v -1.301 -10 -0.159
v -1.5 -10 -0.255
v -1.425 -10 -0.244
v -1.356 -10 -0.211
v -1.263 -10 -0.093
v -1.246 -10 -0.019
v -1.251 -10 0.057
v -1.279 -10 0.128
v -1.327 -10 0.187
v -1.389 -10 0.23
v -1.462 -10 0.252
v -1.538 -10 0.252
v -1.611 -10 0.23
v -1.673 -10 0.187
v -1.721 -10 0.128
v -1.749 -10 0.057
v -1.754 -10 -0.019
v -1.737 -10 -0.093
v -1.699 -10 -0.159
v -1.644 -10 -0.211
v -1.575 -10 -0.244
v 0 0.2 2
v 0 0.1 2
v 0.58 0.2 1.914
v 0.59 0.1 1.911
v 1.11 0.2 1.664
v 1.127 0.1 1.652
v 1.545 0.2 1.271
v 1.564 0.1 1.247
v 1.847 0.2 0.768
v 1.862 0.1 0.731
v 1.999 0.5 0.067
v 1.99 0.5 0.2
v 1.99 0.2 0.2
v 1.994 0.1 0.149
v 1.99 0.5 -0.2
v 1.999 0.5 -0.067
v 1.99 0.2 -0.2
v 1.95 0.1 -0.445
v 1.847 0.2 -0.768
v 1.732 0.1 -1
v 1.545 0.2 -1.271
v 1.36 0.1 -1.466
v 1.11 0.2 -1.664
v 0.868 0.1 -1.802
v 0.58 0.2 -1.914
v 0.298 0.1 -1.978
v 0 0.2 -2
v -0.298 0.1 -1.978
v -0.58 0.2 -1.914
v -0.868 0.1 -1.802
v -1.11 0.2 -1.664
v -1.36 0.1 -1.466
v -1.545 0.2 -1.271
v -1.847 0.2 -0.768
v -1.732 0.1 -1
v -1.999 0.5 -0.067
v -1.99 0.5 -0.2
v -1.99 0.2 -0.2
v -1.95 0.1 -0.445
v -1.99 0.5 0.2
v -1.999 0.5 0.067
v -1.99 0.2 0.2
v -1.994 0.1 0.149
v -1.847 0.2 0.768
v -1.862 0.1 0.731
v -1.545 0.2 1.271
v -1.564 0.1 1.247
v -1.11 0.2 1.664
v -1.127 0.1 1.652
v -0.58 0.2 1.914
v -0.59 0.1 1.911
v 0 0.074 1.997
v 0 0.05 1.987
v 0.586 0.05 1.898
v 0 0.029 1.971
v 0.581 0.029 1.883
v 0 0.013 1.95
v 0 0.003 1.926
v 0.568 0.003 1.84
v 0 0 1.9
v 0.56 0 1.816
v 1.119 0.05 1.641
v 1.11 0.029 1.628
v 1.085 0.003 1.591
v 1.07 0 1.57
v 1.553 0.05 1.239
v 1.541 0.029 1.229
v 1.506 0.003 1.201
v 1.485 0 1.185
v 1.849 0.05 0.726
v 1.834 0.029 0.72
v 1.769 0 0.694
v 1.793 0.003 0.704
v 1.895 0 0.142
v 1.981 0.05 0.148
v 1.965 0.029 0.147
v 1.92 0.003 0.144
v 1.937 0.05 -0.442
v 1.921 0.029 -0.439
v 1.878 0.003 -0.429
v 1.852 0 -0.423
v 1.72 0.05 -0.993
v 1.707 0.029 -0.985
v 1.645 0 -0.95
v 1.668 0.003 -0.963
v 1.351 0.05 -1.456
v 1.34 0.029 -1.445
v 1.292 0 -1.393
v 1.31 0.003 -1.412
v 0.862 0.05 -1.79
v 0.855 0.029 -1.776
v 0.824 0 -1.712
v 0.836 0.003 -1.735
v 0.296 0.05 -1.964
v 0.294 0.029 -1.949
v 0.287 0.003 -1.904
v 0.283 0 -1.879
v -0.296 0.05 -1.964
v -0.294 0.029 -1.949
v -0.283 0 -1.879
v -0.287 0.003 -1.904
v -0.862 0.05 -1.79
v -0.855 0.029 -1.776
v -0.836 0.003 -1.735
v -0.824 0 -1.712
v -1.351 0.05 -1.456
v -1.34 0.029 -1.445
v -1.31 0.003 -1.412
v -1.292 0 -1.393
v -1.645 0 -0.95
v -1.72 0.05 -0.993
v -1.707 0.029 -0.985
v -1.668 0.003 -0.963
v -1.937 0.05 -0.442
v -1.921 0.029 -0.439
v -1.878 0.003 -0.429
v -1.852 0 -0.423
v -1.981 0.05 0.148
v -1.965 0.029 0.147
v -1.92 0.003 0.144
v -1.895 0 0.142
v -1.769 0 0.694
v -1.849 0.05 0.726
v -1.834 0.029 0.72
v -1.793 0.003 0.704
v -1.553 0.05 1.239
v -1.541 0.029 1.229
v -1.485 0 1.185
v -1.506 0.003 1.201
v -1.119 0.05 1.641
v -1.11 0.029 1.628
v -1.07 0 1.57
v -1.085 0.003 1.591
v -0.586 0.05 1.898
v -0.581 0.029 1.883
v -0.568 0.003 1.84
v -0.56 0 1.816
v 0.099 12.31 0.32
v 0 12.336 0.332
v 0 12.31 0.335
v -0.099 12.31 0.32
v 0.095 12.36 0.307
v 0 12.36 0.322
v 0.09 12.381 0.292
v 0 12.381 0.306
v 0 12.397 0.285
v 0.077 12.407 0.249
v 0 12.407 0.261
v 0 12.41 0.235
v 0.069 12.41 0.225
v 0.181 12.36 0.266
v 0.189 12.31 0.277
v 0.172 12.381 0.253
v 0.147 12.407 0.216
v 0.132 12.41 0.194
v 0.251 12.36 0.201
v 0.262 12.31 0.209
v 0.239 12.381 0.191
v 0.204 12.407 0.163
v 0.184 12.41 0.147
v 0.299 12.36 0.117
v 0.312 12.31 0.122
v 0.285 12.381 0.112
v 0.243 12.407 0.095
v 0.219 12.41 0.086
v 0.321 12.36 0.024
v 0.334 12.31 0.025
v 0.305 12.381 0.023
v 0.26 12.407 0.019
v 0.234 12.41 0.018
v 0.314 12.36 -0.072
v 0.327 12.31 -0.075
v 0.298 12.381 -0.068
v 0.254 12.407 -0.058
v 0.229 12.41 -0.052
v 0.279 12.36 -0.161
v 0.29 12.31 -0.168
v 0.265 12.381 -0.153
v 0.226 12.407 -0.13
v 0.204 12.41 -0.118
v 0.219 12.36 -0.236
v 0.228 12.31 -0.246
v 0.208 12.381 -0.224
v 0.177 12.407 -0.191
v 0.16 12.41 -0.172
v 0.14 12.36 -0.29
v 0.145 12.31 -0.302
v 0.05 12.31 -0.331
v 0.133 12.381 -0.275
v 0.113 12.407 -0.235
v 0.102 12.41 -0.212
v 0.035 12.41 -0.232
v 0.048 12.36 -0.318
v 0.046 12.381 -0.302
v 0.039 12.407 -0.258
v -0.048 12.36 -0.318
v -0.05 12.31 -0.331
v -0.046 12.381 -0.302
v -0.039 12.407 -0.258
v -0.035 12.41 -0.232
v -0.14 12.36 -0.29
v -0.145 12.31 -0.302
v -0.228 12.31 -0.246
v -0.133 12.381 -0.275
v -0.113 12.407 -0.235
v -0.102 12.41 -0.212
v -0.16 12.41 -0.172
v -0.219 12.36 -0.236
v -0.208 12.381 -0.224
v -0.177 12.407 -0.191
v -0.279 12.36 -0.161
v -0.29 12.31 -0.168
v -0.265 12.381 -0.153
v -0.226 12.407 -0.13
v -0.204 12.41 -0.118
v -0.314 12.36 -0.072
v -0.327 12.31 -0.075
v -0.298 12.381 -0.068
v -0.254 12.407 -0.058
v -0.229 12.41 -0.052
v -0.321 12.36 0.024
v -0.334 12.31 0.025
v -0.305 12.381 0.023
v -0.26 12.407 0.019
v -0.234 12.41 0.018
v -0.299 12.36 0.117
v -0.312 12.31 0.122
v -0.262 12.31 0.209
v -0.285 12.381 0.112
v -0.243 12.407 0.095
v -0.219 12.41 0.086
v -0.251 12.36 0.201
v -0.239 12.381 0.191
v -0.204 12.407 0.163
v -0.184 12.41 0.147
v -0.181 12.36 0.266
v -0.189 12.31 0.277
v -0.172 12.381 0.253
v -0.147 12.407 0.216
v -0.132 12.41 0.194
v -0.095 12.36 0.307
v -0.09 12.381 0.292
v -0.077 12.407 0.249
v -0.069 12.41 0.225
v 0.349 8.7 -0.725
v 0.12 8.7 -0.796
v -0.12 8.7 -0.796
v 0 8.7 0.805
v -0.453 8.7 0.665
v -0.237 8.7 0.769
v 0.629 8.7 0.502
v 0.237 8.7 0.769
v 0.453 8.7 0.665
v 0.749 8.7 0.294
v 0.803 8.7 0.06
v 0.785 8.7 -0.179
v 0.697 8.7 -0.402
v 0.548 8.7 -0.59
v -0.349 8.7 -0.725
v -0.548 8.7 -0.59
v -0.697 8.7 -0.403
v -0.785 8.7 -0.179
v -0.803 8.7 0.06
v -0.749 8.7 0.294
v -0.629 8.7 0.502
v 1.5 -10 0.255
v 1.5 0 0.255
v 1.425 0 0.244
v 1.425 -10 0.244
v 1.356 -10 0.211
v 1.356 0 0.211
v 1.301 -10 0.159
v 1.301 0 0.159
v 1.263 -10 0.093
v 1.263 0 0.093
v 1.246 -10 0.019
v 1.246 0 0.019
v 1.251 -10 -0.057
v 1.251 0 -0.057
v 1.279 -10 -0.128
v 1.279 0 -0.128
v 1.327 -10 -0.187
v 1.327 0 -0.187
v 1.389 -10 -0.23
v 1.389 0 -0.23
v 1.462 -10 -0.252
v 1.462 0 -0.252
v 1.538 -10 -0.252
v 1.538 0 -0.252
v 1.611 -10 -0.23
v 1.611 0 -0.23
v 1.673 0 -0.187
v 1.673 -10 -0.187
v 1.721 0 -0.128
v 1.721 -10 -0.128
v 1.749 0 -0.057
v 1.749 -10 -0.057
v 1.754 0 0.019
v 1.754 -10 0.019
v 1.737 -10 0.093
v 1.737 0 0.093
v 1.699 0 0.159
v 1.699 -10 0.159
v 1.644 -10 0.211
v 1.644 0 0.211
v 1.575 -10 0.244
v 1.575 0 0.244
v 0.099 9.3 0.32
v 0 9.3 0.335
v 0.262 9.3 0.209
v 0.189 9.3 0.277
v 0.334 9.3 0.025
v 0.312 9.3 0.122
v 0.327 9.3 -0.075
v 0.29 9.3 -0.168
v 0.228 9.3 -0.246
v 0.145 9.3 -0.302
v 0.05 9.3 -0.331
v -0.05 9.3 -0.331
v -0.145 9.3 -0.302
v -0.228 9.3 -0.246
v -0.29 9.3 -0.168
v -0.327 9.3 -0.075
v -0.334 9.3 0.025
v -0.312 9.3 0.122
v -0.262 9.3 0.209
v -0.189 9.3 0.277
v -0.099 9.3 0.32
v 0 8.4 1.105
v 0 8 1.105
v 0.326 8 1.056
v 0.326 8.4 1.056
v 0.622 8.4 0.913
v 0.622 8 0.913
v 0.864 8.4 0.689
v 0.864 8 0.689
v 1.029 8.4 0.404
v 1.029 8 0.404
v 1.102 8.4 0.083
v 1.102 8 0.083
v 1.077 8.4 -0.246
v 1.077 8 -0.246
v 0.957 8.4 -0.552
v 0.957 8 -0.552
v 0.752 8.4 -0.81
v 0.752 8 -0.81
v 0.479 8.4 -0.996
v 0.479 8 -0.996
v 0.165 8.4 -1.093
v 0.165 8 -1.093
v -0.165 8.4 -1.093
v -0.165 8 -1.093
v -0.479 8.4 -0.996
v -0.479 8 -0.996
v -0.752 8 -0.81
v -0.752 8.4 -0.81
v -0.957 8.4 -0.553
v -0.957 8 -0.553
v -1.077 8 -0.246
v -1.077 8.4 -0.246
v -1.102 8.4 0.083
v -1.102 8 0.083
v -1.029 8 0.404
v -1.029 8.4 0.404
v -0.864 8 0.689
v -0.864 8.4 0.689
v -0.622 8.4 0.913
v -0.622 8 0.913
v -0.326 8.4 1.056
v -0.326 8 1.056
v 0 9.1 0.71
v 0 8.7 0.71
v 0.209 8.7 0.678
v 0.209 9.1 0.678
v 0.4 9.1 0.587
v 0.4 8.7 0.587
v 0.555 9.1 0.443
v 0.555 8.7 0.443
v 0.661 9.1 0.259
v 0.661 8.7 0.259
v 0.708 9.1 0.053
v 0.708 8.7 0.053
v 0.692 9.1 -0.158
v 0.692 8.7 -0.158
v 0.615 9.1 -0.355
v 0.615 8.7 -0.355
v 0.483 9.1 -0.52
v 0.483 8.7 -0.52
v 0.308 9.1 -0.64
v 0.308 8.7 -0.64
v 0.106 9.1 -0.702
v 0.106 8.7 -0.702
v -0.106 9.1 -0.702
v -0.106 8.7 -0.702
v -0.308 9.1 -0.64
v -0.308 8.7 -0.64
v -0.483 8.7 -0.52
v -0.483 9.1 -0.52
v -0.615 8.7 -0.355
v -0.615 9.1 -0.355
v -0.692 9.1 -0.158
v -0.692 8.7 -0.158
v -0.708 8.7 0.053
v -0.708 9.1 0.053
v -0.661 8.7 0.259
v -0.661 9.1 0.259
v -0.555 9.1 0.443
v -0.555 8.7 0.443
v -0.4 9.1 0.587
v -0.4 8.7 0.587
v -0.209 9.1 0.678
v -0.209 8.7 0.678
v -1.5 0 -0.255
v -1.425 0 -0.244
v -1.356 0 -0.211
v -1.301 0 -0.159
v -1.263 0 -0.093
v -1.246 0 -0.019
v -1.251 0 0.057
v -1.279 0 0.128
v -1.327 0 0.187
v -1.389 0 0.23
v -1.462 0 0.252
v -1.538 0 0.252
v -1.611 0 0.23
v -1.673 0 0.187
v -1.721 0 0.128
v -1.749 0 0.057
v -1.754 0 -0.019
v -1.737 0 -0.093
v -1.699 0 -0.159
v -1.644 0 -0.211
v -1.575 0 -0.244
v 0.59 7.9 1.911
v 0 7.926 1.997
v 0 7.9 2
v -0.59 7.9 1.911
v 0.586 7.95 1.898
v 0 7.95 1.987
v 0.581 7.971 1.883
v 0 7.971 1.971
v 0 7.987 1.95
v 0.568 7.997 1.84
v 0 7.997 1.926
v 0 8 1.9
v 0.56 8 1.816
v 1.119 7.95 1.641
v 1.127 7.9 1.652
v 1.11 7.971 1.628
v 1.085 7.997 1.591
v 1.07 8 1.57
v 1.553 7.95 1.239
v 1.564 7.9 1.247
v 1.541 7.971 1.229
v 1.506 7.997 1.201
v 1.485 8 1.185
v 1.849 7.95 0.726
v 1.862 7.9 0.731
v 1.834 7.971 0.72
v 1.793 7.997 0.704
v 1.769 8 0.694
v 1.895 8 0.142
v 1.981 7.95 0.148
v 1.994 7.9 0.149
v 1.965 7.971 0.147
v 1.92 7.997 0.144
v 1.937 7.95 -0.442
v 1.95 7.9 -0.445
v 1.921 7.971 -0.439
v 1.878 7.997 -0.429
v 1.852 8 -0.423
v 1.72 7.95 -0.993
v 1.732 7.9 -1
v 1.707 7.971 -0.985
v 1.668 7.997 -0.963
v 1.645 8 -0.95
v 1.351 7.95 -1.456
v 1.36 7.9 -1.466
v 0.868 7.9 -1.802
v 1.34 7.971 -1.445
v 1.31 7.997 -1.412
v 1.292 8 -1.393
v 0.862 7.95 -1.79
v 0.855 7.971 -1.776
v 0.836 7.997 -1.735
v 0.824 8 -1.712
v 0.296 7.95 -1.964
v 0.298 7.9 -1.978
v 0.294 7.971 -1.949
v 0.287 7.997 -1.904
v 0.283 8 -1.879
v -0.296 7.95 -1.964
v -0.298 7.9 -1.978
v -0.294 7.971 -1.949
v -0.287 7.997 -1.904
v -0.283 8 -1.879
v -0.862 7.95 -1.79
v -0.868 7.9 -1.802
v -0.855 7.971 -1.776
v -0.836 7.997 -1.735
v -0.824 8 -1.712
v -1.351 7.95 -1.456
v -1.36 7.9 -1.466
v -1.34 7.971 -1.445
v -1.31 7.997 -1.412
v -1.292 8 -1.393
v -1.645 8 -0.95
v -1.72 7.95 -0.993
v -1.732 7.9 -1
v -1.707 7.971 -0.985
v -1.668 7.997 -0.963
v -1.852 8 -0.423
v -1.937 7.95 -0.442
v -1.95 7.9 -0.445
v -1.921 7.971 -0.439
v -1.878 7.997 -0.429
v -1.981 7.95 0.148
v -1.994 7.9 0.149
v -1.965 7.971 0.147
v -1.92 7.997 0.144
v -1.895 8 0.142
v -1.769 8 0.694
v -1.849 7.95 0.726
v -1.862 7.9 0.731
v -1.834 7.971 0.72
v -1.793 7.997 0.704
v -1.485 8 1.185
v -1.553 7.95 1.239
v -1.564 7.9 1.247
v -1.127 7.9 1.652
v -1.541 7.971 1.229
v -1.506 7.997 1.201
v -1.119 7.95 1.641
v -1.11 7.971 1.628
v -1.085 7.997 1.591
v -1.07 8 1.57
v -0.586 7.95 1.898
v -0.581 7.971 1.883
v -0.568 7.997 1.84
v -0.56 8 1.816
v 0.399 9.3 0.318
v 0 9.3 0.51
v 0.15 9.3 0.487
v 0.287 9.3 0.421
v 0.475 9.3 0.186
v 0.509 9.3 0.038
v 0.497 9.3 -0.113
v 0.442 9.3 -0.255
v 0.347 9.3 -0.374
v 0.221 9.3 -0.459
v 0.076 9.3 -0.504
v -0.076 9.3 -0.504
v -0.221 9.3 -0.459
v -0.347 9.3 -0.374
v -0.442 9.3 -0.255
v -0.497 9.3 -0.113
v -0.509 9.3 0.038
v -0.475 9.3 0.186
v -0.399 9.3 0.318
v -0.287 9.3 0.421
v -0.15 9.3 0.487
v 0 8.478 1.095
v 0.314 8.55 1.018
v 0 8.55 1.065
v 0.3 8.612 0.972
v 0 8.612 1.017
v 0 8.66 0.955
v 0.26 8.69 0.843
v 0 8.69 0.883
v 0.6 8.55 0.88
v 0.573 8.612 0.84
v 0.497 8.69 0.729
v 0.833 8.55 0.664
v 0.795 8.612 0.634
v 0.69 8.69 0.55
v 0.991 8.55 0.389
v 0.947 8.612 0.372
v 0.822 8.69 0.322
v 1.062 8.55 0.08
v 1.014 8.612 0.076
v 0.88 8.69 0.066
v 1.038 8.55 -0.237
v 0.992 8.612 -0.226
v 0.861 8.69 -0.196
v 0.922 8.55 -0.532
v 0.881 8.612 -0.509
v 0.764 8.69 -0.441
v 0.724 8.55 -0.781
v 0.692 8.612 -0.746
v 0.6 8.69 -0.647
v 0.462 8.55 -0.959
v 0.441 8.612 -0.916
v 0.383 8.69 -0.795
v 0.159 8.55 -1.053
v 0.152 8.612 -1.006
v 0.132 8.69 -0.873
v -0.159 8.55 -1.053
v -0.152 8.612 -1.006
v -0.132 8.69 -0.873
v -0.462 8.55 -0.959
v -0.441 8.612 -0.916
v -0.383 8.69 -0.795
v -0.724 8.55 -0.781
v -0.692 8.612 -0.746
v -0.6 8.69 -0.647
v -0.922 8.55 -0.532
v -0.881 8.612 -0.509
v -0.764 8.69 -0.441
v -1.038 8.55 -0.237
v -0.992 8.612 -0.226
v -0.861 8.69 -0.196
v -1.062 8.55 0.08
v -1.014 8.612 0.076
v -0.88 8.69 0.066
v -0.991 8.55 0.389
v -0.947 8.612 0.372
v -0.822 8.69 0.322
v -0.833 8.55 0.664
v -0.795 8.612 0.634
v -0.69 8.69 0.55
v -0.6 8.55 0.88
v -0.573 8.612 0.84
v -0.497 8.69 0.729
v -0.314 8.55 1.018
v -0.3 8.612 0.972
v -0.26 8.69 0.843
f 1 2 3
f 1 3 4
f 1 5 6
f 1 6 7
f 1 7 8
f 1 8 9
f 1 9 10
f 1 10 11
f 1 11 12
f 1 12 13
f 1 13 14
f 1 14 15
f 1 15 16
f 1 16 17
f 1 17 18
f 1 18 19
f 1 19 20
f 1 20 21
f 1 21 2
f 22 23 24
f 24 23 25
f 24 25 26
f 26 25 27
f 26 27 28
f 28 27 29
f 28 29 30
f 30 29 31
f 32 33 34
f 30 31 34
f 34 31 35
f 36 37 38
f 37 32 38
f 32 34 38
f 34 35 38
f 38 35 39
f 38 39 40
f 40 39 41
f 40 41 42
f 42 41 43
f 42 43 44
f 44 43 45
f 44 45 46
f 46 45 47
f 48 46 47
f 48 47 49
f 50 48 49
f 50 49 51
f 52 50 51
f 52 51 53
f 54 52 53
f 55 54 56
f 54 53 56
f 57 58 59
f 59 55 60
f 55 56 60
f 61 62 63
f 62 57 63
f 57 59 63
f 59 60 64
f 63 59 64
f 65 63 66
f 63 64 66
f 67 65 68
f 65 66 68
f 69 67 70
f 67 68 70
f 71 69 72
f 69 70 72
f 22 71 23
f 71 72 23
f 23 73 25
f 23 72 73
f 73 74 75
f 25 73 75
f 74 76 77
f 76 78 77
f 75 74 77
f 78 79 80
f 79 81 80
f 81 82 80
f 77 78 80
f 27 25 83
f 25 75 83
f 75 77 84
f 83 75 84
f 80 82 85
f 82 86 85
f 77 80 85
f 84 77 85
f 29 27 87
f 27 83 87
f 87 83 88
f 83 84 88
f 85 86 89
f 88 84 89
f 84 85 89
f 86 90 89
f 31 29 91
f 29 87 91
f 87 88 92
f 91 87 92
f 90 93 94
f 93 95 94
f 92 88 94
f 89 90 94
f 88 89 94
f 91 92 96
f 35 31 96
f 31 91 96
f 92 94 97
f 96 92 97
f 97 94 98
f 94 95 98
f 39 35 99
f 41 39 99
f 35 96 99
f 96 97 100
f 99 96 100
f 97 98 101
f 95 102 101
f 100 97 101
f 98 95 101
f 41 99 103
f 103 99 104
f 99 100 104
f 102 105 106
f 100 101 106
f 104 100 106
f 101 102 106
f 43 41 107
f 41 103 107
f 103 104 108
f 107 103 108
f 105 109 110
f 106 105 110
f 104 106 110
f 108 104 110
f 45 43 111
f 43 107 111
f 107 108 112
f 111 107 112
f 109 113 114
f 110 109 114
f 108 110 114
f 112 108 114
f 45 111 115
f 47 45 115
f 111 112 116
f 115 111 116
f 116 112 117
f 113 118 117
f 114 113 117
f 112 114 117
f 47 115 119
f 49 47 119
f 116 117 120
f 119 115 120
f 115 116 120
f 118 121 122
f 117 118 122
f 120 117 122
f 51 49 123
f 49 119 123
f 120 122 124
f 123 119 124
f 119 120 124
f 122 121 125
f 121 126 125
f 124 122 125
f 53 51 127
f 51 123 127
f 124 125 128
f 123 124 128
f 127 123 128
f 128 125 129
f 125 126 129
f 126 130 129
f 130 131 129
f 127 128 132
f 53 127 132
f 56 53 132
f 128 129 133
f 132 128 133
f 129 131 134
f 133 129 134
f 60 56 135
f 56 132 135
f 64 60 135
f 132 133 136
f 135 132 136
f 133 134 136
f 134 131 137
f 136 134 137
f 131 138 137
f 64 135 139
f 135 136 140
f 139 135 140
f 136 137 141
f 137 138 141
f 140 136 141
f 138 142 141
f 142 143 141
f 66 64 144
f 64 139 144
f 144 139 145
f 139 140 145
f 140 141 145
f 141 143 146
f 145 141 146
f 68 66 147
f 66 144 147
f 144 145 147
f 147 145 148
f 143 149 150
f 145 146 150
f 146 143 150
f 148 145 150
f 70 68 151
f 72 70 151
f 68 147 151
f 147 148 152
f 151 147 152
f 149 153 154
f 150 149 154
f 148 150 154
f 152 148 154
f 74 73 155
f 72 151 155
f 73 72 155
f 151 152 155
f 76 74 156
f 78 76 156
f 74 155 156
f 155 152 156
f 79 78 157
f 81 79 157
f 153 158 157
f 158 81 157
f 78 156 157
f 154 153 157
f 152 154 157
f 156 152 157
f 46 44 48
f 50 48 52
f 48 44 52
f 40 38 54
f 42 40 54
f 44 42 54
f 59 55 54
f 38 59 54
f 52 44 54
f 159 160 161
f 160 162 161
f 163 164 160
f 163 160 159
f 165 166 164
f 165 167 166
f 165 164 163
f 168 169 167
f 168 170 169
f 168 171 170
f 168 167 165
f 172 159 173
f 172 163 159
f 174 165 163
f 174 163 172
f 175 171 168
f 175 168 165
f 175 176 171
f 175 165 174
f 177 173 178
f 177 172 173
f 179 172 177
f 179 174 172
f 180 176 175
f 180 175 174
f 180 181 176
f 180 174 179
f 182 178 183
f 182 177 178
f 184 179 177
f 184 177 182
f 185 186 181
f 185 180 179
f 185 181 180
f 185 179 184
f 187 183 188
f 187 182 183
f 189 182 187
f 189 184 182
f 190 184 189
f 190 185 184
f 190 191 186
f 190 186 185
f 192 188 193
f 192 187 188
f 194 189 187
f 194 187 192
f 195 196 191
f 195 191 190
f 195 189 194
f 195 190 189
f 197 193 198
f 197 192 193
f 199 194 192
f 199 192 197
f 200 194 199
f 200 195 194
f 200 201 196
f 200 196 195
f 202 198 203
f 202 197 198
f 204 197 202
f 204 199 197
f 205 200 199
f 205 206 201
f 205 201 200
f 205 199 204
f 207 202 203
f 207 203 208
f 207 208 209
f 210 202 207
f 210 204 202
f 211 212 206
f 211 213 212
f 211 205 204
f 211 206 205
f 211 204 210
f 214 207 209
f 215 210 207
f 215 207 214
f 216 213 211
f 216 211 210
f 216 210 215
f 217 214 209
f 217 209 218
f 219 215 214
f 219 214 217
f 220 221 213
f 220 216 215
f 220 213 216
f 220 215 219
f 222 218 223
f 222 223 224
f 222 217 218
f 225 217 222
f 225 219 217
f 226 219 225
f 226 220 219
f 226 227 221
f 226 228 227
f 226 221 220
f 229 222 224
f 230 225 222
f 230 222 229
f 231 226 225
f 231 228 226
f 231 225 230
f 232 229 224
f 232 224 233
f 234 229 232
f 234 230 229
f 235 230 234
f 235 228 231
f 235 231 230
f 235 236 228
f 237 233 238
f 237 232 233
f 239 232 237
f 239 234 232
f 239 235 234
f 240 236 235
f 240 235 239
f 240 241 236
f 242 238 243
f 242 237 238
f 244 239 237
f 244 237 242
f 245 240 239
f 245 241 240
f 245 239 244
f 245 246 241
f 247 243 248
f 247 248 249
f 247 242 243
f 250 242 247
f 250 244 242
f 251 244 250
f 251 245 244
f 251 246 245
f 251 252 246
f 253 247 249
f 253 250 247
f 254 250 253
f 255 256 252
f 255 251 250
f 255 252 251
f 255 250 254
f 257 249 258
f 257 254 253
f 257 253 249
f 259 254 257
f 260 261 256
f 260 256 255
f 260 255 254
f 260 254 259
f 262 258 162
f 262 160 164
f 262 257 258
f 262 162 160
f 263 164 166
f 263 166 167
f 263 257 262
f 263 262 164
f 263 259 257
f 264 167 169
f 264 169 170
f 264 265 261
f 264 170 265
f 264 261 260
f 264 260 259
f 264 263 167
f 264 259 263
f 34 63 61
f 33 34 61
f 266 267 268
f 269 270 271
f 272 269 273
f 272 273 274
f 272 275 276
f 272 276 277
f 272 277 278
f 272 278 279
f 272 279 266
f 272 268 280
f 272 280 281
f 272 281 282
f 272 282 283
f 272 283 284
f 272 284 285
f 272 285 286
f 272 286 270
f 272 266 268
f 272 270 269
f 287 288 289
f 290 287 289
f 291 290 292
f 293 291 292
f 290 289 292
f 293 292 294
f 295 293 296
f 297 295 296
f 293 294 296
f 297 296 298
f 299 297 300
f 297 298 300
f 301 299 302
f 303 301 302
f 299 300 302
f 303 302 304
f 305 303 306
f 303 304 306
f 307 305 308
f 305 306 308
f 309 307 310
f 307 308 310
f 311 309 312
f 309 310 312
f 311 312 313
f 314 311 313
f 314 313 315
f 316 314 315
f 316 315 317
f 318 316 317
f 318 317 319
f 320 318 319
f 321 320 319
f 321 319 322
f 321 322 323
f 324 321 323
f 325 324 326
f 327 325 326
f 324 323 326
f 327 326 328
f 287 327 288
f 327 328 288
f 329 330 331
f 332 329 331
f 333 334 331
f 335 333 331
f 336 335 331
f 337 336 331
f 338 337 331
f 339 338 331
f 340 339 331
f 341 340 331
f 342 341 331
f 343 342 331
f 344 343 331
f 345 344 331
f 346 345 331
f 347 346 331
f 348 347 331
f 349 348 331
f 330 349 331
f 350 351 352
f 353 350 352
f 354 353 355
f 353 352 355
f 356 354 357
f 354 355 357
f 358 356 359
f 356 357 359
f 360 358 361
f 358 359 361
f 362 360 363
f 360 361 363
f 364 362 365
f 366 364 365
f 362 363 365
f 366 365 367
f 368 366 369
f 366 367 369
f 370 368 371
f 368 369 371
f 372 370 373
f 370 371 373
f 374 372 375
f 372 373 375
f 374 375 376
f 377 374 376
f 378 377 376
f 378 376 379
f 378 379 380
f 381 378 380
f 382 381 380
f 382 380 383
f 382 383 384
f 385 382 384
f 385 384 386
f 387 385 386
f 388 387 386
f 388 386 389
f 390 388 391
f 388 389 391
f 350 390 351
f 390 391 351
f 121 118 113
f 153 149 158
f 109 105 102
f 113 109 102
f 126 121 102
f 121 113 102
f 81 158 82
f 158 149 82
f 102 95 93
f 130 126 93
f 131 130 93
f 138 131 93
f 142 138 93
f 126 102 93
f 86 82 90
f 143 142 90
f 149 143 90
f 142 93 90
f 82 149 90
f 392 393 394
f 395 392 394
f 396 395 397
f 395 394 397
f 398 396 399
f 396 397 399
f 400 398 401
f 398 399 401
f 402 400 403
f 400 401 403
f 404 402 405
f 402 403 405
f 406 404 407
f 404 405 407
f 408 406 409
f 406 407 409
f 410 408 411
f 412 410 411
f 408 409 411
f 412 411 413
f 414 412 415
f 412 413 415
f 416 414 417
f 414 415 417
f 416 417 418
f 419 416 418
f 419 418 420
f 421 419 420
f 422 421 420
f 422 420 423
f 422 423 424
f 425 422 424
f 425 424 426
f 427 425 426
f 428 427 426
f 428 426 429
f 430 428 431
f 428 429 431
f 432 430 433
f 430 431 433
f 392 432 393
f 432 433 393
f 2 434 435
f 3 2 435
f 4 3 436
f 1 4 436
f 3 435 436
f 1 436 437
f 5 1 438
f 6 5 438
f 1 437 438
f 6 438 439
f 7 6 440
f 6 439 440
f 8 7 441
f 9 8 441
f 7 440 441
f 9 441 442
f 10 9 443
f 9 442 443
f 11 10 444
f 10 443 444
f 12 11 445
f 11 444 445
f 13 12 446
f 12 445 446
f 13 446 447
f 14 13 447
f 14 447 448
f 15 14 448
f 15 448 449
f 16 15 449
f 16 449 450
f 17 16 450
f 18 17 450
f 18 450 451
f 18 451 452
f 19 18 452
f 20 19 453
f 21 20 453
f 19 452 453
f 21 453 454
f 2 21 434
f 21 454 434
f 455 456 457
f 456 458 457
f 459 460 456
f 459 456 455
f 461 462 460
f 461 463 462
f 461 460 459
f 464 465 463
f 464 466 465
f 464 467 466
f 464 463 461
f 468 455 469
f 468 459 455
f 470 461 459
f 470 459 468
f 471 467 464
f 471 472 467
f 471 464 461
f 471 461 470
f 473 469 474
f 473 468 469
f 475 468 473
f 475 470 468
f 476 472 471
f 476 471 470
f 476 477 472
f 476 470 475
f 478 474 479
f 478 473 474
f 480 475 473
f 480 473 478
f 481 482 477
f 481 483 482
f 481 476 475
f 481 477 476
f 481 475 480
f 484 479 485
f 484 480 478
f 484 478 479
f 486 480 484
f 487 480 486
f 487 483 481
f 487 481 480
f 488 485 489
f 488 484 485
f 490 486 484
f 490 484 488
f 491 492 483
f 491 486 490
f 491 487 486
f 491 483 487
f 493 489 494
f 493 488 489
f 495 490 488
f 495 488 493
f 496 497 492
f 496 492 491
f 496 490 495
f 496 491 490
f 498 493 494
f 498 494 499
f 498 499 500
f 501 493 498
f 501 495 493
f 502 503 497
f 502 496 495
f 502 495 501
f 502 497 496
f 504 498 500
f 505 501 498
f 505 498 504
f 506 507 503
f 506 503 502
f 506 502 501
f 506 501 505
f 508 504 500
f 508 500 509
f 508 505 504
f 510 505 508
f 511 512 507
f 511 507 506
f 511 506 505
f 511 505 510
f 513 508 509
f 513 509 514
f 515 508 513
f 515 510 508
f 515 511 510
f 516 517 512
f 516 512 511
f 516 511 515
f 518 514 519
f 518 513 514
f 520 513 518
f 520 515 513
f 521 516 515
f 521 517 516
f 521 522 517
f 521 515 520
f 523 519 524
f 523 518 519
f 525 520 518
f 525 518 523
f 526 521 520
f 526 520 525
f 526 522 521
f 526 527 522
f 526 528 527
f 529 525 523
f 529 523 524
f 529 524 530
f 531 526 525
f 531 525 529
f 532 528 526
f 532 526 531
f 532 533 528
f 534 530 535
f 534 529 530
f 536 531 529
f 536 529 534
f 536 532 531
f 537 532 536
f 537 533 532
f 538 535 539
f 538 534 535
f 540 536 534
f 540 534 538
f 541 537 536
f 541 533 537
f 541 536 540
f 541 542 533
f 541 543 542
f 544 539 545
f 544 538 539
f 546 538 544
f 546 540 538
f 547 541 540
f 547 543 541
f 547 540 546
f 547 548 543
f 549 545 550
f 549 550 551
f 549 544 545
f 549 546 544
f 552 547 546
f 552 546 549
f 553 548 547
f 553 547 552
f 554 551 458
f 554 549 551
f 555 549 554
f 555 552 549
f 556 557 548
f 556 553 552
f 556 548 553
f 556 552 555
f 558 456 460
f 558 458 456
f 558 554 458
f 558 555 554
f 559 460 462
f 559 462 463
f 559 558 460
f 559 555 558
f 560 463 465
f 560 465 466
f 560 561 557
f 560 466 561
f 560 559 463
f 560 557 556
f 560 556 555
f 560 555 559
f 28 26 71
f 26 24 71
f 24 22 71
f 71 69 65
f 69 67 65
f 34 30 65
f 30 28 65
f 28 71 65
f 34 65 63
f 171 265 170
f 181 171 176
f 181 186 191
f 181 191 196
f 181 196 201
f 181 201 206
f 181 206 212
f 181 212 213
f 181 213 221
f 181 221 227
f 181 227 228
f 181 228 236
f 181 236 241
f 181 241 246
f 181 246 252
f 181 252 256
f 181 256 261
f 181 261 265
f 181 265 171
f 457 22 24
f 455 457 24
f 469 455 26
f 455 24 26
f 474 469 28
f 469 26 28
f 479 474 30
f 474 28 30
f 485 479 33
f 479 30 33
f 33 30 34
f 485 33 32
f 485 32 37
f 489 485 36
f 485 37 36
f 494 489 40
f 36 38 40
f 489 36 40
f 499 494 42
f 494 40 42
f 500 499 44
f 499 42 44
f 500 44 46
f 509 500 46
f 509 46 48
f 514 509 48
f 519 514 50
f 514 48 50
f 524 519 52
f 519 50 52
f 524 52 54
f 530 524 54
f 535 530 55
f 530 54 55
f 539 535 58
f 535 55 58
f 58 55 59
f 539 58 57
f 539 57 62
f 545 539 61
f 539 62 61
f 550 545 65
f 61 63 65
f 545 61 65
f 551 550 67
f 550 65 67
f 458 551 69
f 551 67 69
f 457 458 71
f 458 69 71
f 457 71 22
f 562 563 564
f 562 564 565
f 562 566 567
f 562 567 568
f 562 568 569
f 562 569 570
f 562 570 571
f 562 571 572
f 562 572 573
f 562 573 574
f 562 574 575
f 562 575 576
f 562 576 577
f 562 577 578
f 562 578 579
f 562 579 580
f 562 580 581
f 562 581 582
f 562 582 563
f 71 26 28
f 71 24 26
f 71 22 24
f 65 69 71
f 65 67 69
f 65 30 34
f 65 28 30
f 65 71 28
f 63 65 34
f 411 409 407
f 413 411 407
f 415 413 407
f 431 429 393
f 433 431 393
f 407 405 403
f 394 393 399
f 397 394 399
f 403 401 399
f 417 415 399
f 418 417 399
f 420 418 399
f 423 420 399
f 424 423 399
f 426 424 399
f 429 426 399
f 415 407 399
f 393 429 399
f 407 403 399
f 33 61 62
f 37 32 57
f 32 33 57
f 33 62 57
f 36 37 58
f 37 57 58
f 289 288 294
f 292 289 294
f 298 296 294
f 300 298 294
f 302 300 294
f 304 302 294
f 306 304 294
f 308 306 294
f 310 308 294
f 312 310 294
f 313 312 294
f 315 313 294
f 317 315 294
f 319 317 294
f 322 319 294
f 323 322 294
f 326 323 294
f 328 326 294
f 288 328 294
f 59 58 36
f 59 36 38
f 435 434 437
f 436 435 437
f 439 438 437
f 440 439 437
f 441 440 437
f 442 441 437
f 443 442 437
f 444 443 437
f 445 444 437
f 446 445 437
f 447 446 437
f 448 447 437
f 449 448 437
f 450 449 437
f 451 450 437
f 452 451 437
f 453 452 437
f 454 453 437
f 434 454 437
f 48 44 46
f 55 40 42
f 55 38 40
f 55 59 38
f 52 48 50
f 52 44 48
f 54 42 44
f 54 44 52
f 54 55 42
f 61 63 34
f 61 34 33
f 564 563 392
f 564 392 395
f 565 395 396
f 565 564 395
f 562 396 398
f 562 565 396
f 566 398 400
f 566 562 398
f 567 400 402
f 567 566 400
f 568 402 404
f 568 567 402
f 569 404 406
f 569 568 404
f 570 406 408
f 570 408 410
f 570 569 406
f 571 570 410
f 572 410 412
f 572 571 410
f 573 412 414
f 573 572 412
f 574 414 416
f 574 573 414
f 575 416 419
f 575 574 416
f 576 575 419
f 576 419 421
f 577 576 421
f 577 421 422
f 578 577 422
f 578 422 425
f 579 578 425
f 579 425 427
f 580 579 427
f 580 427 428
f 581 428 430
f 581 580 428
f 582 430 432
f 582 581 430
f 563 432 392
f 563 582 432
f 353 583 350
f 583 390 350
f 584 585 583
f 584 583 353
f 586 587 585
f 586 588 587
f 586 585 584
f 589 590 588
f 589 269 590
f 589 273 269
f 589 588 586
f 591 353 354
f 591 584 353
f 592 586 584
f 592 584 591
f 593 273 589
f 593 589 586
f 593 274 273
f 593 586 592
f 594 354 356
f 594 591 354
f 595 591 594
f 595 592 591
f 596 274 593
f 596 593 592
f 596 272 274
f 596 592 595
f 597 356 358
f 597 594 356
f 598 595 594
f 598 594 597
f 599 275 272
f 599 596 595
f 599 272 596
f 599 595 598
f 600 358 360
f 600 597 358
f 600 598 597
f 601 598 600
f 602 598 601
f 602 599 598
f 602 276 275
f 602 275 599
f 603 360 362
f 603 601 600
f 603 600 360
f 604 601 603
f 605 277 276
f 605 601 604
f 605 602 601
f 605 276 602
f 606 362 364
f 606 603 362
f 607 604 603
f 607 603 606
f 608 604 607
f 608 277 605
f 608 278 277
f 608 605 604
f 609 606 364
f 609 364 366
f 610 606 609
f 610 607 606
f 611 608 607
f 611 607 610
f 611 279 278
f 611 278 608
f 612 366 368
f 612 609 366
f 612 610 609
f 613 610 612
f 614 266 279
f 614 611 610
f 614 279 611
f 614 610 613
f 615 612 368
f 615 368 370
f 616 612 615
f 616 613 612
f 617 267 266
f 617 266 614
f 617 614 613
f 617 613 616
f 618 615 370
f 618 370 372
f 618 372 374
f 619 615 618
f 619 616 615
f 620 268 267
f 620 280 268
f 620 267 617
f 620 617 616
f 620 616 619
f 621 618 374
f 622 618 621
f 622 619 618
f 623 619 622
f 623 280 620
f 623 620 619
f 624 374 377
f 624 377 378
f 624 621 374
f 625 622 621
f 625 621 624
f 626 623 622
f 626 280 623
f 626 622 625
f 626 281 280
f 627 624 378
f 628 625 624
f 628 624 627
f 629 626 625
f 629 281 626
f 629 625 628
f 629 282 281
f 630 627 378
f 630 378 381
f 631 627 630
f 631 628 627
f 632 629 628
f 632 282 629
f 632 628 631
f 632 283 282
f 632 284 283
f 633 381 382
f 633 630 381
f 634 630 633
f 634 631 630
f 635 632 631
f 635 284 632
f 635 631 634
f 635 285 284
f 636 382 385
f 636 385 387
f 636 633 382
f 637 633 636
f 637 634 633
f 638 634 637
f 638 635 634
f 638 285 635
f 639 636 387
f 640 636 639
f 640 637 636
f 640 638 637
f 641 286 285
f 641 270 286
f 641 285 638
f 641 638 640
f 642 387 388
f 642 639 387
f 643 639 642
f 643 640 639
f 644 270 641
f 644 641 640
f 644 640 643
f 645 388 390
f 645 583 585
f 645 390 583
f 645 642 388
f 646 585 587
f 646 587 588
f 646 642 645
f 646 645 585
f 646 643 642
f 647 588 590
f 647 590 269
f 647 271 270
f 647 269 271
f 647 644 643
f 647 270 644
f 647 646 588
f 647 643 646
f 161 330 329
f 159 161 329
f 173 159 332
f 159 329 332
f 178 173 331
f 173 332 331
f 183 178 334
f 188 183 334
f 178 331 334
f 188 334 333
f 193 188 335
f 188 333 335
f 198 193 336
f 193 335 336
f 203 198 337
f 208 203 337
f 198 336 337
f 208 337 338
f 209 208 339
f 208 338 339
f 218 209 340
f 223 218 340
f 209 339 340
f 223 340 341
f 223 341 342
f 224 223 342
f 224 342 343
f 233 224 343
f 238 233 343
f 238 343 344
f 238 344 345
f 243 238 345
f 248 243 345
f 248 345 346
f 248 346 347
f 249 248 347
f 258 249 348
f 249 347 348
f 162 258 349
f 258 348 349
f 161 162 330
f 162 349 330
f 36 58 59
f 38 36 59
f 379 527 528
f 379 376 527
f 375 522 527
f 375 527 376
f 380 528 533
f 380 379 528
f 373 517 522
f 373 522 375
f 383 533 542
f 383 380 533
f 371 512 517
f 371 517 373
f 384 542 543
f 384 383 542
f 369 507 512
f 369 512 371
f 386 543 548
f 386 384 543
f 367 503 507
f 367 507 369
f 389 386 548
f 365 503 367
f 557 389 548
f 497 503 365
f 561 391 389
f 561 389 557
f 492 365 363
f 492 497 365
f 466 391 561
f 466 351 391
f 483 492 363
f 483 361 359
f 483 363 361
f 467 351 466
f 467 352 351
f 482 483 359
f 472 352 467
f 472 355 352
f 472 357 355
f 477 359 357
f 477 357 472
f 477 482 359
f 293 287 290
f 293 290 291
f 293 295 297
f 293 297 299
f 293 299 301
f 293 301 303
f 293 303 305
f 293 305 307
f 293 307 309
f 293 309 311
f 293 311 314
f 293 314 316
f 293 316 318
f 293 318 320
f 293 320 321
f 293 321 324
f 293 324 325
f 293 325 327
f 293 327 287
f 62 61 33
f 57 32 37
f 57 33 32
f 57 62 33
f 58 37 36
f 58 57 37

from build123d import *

# Parameters (mm, degrees)
SKETCH1_R              = 2
BOSS_EXTRUDE1_DEPTH    = 8
SKETCH2_R              = 1.105
BOSS_EXTRUDE2_DEPTH    = 0.7
SKETCH3_R              = 0.71
BOSS_EXTRUDE3_DEPTH    = 0.6
SKETCH4_R              = 0.335
BOSS_EXTRUDE4_DEPTH    = 3.11
SPLIT1_SURFACE_1_BACK  = 14.638
SPLIT1_SURFACE_1_DEPTH = 29.276
SPLIT1_SURFACE_2_BACK  = 14.638
SPLIT1_SURFACE_2_DEPTH = 29.276
FILLET1_R              = 0.1
FILLET2_R              = 0.1
FILLET3_R              = 0.3
CHAMFER1_SIZE          = 0.2
FILLET4_R              = 0.1
SKETCH6_R              = 0.255
BOSS_EXTRUDE5_DEPTH    = 10
BOSS_EXTRUDE5_2_DEPTH  = 10


with BuildPart() as part:
    # Sketch1 → Boss-Extrude1 (new body)
    with BuildSketch(Plane(origin=(0, 0, 0), x_dir=(1, 0, 0), z_dir=(0, 1, 0))):
        with Locations(Location((0, 0, 0), (0, 0, 270))):
            Circle(SKETCH1_R)
    extrude(amount=BOSS_EXTRUDE1_DEPTH)

    # Sketch2 → Boss-Extrude2 (add)
    with BuildSketch(Plane(origin=(0, 8, 0), x_dir=(1, 0, 0), z_dir=(0, 1, 0))):
        with Locations(Location((0, 0, 0), (0, 0, 270))):
            Circle(SKETCH2_R)
    extrude(amount=BOSS_EXTRUDE2_DEPTH)


with BuildPart() as body_2:
    # Sketch3 → Boss-Extrude3 (new body)
    with BuildSketch(Plane(origin=(0, 8.7, 0), x_dir=(1, 0, 0), z_dir=(0, 1, 0))):
        with Locations(Location((0, 0, 0), (0, 0, 270))):
            Circle(SKETCH3_R)
    extrude(amount=BOSS_EXTRUDE3_DEPTH)

    # Chamfer1
    chamfer1_edges = [body_2.edges().sort_by_distance(p)[0] for p in [
        (0, 9.3, -0.71),
    ]]
    chamfer(chamfer1_edges, length=CHAMFER1_SIZE)


with BuildPart() as body_3:
    # Sketch4 → Boss-Extrude4 (new body)
    with BuildSketch(Plane(origin=(0, 9.3, 0), x_dir=(1, 0, 0), z_dir=(0, 1, 0))):
        with Locations(Location((0, 0, 0), (0, 0, 270))):
            Circle(SKETCH4_R)
    extrude(amount=BOSS_EXTRUDE4_DEPTH)

    # Fillet4
    fillet4_edges = [body_3.edges().sort_by_distance(p)[0] for p in [
        (0, 12.41, -0.335),
    ]]
    fillet(fillet4_edges, radius=FILLET4_R)


with BuildPart() as body_4:
    # Split1: the piece behind the surface
    add(part.part)
    # Split1 surface: a surface, the sketch's curves swept straight by 29.276 mm
    with BuildLine(Plane(origin=(0, 0, 0), x_dir=(0, 0, -1), z_dir=(1, 0, 0)).offset(-SPLIT1_SURFACE_1_BACK), mode=Mode.PRIVATE) as split1_surface_1_path:
        Line((-2, 0.2), (-0.2, 0.2))
        Line((-0.2, 0.2), (-0.2, 0.5))
        Line((-0.2, 0.5), (0.2, 0.5))
        Line((0.2, 0.5), (0.2, 0.2))
        Line((0.2, 0.2), (2, 0.2))
    split1_surface_1 = Shell.extrude(split1_surface_1_path.wire(), (1 * SPLIT1_SURFACE_1_DEPTH, 0 * SPLIT1_SURFACE_1_DEPTH, 0 * SPLIT1_SURFACE_1_DEPTH))
    split(bisect_by=split1_surface_1, keep=Keep.BOTTOM)

    # Fillet1
    fillet1_edges = [body_4.edges().sort_by_distance(p)[0] for p in [
        (0, 0, -2),
    ]]
    fillet(fillet1_edges, radius=FILLET1_R)


with BuildPart() as part_1:
    add(part.part)

    # Split1: split by a surface, the side it looks to stays
    # Split1 surface: a surface, the sketch's curves swept straight by 29.276 mm
    with BuildLine(Plane(origin=(0, 0, 0), x_dir=(0, 0, -1), z_dir=(1, 0, 0)).offset(-SPLIT1_SURFACE_2_BACK), mode=Mode.PRIVATE) as split1_surface_2_path:
        Line((-2, 0.2), (-0.2, 0.2))
        Line((-0.2, 0.2), (-0.2, 0.5))
        Line((-0.2, 0.5), (0.2, 0.5))
        Line((0.2, 0.5), (0.2, 0.2))
        Line((0.2, 0.2), (2, 0.2))
    split1_surface_2 = Shell.extrude(split1_surface_2_path.wire(), (1 * SPLIT1_SURFACE_2_DEPTH, 0 * SPLIT1_SURFACE_2_DEPTH, 0 * SPLIT1_SURFACE_2_DEPTH))
    split(bisect_by=split1_surface_2, keep=Keep.TOP)

    # Fillet2
    fillet2_edges = [part_1.edges().sort_by_distance(p)[0] for p in [
        (0, 8, -2),
    ]]
    fillet(fillet2_edges, radius=FILLET2_R)

    # Fillet3
    fillet3_edges = [part_1.edges().sort_by_distance(p)[0] for p in [
        (0, 8.7, -1.105),
    ]]
    fillet(fillet3_edges, radius=FILLET3_R)


with BuildPart() as body_5:
    # Sketch6 → Boss-Extrude5 (new body)
    with BuildSketch(Plane.XZ):
        with Locations(Location((-1.5, 0, 0), (0, 0, 270))):
            Circle(SKETCH6_R)
    extrude(amount=BOSS_EXTRUDE5_DEPTH)


with BuildPart() as body_6:
    # Sketch6 → Boss-Extrude5 2 (new body)
    with BuildSketch(Plane.XZ):
        with Locations(Location((1.5, 0, 0), (0, 0, 90))):
            Circle(SKETCH6_R)
    extrude(amount=BOSS_EXTRUDE5_2_DEPTH)


solid = Compound([body_2.part, body_3.part, body_4.part, part_1.part, body_5.part, body_6.part])
